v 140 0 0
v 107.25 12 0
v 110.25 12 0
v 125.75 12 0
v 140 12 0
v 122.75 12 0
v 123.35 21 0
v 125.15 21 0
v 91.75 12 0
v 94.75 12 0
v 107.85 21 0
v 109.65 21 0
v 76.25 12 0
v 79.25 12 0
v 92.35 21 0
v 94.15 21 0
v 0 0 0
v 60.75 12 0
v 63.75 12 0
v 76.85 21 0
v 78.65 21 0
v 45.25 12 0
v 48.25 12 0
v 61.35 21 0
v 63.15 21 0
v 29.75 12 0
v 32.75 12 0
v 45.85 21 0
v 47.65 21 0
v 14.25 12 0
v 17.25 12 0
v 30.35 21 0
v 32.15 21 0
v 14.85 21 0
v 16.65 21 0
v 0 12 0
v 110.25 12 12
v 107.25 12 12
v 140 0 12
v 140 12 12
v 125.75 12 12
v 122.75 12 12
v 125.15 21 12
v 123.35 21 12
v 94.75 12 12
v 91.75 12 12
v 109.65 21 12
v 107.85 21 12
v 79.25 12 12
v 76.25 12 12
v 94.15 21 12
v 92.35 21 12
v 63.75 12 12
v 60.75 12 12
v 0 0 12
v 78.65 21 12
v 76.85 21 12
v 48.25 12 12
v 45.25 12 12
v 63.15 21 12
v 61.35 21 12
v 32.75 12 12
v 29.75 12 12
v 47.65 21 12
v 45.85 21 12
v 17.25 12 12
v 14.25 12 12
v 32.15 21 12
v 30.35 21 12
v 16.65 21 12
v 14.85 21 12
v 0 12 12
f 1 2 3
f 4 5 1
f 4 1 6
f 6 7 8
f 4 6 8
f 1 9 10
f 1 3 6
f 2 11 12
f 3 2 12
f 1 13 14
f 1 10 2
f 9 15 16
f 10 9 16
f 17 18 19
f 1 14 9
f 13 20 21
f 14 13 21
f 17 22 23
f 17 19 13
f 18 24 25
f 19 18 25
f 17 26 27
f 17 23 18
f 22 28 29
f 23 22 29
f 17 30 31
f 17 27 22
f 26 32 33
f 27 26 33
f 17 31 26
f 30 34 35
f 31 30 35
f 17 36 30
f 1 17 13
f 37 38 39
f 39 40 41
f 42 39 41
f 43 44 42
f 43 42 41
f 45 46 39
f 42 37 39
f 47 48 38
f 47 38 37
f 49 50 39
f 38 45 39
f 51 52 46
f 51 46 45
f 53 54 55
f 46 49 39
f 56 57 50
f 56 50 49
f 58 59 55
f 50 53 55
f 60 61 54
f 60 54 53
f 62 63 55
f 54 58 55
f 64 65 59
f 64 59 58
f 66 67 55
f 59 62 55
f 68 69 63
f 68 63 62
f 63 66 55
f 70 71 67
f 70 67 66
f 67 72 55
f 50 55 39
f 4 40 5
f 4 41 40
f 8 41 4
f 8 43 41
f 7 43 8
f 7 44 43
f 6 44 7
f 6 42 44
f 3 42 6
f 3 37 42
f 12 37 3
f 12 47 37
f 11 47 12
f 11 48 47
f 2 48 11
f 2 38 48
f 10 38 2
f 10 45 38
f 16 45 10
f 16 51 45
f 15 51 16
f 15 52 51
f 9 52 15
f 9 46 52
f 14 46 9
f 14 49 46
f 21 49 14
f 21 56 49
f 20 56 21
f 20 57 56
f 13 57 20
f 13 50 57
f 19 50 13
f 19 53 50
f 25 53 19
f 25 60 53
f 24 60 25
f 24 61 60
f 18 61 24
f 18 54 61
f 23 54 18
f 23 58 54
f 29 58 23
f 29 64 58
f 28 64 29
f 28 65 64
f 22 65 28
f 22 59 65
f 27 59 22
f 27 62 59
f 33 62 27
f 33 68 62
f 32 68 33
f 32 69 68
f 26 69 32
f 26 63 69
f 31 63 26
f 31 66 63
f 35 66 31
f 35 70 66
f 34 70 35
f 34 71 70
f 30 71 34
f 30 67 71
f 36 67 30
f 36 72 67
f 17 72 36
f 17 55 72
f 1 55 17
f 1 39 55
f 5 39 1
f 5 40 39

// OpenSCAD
$fn = 32;

// ----------------------------------------------------------------------
// Gear rack: 8 teeth on a 140 mm bar, pitch 15.5 mm
// ----------------------------------------------------------------------

// --- parameters (mm) ---
profile_height = 12;      // extrusion height
profile_points = 36;      // points of the closed outline

profile = [[0, 0], [140, 0], [140, 12], [125.75, 12], [125.15, 21], [123.35, 21], [122.75, 12], [110.25, 12], [109.65, 21], [107.85, 21], [107.25, 12], [94.75, 12], [94.15, 21], [92.35, 21], [91.75, 12], [79.25, 12], [78.65, 21], [76.85, 21], [76.25, 12], [63.75, 12], [63.15, 21], [61.35, 21], [60.75, 12], [48.25, 12], [47.65, 21], [45.85, 21], [45.25, 12], [32.75, 12], [32.15, 21], [30.35, 21], [29.75, 12], [17.25, 12], [16.65, 21], [14.85, 21], [14.25, 12], [0, 12]];  // single closed polygon, 36 points, counter clockwise

// --- the one profile operation ---
linear_extrude(height = profile_height) polygon(points = profile);
